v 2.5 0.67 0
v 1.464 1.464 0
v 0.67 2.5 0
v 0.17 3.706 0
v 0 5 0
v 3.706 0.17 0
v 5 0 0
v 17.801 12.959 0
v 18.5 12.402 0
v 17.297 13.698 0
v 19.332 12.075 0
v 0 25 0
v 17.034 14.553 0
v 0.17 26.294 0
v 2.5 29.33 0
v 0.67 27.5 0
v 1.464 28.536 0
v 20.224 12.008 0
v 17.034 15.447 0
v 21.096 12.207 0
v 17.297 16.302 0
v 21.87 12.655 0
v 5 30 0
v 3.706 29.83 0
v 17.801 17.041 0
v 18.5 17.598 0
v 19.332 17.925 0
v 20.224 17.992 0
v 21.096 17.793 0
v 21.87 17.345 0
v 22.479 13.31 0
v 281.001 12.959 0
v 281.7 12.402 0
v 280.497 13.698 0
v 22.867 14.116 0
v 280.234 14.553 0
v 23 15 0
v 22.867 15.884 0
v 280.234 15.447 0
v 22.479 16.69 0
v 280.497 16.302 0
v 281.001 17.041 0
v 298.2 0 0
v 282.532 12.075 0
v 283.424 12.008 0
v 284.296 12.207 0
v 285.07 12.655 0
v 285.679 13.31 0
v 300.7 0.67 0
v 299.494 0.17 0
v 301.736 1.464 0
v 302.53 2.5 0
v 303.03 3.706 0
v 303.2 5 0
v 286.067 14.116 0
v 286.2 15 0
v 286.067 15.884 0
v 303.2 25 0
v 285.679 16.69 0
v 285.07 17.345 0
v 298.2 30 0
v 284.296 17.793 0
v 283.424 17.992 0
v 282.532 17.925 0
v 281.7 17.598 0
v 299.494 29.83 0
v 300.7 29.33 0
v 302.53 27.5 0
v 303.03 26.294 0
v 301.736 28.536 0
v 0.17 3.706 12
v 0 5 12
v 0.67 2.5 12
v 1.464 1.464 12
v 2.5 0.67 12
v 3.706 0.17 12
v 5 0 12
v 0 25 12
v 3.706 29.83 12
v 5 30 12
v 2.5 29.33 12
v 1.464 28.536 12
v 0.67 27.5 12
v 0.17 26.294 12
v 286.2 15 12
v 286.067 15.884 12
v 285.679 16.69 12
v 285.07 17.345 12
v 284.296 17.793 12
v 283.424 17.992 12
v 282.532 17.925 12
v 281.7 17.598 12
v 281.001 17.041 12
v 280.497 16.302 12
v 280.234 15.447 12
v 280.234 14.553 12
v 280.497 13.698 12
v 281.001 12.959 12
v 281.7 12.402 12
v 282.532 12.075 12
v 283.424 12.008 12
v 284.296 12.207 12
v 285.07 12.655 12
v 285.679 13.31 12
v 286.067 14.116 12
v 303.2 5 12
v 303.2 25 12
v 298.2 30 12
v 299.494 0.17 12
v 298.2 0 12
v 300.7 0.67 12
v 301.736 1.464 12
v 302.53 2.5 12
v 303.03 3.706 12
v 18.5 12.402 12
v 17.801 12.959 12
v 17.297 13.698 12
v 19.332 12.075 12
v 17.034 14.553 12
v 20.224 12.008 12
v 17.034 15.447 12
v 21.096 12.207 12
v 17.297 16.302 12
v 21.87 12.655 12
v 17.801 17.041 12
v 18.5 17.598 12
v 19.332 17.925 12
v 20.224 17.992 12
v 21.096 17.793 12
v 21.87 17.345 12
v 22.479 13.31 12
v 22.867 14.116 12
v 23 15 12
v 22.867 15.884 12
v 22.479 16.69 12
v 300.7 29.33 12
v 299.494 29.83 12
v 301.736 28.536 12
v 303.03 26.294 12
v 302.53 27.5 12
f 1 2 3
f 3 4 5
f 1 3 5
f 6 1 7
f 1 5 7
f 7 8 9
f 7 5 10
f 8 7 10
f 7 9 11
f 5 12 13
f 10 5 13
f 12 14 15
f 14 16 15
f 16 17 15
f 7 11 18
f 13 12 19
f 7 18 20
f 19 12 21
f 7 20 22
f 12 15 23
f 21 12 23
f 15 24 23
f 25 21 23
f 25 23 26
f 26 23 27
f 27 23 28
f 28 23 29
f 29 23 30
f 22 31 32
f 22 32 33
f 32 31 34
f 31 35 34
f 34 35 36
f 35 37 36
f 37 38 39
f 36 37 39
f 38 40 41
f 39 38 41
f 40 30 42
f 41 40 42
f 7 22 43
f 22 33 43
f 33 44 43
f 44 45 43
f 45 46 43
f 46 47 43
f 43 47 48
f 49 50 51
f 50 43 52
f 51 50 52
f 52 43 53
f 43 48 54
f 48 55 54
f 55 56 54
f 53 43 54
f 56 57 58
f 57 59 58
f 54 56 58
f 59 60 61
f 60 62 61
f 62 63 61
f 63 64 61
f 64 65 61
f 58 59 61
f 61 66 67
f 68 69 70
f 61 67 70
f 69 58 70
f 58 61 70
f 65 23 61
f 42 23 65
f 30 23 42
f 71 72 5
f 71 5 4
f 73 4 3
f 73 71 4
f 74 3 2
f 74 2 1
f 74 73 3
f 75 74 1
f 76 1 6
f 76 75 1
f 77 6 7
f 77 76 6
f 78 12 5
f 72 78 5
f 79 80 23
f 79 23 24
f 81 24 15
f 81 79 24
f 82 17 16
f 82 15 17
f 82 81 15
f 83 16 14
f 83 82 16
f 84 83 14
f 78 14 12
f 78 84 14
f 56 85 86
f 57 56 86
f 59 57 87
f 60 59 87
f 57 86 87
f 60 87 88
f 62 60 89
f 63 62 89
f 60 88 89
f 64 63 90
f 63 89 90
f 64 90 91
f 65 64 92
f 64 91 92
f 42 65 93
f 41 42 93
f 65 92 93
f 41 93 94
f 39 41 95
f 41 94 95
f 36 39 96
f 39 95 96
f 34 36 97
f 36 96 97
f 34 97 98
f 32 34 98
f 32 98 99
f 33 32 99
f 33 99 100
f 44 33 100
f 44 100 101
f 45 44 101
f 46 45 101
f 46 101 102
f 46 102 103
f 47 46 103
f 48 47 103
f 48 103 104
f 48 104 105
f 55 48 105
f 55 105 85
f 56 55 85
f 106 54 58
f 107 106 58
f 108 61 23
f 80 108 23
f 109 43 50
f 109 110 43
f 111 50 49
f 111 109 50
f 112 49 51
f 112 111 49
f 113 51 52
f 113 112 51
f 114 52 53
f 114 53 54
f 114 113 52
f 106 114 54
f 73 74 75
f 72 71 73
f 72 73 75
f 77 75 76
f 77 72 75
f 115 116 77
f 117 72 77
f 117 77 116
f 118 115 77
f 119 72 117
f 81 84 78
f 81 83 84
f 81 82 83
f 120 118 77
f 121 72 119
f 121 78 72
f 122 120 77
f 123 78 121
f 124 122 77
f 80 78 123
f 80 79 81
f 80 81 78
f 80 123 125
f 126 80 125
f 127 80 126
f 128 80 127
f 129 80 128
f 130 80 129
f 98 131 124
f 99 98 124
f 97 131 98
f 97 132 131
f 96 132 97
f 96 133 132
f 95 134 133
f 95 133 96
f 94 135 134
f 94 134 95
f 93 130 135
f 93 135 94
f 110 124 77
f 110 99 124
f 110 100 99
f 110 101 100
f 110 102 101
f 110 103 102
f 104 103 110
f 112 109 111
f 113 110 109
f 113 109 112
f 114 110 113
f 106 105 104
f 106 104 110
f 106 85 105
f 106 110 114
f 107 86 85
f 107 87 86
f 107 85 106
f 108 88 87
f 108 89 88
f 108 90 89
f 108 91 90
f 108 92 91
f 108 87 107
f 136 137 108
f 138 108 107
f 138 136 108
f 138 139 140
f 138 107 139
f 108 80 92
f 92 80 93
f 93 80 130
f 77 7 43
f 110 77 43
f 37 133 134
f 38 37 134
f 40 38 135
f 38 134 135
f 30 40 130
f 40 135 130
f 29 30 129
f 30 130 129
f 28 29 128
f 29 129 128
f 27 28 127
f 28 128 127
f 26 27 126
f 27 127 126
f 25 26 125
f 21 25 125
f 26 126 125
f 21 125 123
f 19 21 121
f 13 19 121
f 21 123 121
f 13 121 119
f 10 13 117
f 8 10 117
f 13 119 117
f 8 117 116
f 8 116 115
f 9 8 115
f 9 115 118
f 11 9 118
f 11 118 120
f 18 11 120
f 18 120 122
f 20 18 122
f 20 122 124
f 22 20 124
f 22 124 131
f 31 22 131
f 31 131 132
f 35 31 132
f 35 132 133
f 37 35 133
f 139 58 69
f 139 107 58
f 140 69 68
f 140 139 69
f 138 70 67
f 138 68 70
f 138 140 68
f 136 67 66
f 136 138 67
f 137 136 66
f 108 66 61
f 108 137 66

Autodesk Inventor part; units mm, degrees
ref_plane "YZ Plane" through (0, 0, 0) normal (1, 0, 0) x (0, 1, 0)
ref_plane "XZ Plane" through (0, 0, 0) normal (0, 1, 0) x (-1, 0, 0)
ref_plane "XY Plane" through (0, 0, 0) normal (0, 0, 1) x (1, 0, 0)
sketch "Sketch1" plane through (0, 0, 0) normal (0, 0, 1) x (1, 0, 0)
  line L0 (0, 0) -> (303.2, 0)
  line L1 (303.2, 0) -> (303.2, 30)
  line L2 (303.2, 30) -> (0, 30)
  line L3 (0, 30) -> (0, 0)
  dimension "d0" = 303.2
  dimension "d1" = 30
extrude "Extrusion1" add sketch "Sketch1" along normal blind 12
fillet "Fillet1" radius 5 1 edges at (0, 30, 6)
fillet "Fillet2" radius 5 3 edges at (303.2, 30, 6) (303.2, 0, 6) (0, 0, 6)
sketch "Sketch2" plane through (0, 0, 12) normal (0, 0, 1) x (1, 0, 0)
  line L0 (0, 25) -> (0, 5) projected
  line L1 (0, 15) -> (20, 15)
  circle A0 centre (20, 15) radius 3
  line L2 (5, 0) -> (298.2, 0) projected
  line L3 (151.6, 0) -> (151.6, 30)
  line L4 (298.2, 30) -> (5, 30) projected
  circle A1 centre (283.2, 15) radius 3
  point P0 (0, 0)
  dimension "d6" = 20
  dimension "d7" = 6
extrude "Extrusion2" cut sketch "Sketch2" against normal through all
properties part number "Fourbar-Coupler"
